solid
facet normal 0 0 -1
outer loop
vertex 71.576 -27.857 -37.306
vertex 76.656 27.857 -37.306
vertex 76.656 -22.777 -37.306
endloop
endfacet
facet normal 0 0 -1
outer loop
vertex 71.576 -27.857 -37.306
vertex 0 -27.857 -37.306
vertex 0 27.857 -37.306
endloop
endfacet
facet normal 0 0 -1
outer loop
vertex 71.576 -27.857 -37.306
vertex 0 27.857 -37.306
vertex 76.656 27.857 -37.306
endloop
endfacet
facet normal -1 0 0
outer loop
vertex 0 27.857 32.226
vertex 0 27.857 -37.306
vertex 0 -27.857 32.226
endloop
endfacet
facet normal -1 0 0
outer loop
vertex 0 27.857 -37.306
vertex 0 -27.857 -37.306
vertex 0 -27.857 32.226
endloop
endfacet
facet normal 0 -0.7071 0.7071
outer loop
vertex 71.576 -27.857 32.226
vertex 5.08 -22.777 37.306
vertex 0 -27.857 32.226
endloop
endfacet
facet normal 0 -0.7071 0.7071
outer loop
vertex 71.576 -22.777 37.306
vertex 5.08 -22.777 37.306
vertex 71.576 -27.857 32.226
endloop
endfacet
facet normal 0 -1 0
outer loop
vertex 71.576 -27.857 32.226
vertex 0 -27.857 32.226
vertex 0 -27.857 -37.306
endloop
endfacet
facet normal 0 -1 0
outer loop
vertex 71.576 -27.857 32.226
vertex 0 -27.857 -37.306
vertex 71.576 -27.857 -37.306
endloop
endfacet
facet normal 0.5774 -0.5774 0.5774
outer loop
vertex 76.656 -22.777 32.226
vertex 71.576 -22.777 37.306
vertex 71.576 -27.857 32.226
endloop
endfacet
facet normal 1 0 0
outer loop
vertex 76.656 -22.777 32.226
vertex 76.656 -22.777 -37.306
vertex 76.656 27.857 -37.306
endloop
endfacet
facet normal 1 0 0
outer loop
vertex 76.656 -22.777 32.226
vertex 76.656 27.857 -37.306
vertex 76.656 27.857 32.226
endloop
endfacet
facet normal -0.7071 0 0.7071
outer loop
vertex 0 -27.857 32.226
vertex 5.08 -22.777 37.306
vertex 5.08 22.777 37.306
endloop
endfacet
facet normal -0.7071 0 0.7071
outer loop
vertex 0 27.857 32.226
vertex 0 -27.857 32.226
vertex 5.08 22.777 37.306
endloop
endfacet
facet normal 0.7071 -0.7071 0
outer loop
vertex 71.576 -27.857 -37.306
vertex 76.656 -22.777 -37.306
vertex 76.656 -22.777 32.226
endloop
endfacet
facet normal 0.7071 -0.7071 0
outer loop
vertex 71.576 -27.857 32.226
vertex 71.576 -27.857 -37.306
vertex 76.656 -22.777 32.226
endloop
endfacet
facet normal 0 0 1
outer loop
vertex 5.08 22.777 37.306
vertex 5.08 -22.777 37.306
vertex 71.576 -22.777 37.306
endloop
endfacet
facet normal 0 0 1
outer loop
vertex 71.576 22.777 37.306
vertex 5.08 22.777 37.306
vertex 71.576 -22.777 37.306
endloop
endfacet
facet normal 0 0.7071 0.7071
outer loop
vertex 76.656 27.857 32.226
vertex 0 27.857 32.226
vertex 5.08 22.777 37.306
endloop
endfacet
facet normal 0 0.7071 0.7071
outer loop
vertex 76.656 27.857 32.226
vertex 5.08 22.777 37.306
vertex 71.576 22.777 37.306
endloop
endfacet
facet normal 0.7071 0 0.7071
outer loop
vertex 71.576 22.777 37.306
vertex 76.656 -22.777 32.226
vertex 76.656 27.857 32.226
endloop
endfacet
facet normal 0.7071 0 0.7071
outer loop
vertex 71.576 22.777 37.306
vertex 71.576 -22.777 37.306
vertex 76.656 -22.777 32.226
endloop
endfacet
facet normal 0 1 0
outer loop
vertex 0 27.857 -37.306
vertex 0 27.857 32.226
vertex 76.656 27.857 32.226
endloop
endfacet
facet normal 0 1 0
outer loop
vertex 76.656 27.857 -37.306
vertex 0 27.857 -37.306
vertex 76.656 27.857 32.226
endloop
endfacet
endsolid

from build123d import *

# Parameters (mm, degrees)
F0_W     = 76.6562521458
F0_H     = 74.6114850044
F1_DEPTH = 27.8570577502
F2_SIZE  = 5.08


with BuildPart() as f1:
    # F0 (on Front) → F1 (new body, symmetric)
    with BuildSketch(Plane.XZ):
        with Locations((38.3281260729, 0)):
            Rectangle(F0_W, F0_H)
    extrude(amount=F1_DEPTH, both=True)

    # F2
    f2_edges = [f1.edges().sort_by_distance(p)[0] for p in [
        (76.656252, 0, 37.305743),
        (38.328126, -27.857058, 37.305743),
        (0, 0, 37.305743),
        (76.656252, -27.857058, 0),
        (38.328126, 27.857058, 37.305743),
    ]]
    chamfer(f2_edges, length=F2_SIZE)


solid = f1.part
